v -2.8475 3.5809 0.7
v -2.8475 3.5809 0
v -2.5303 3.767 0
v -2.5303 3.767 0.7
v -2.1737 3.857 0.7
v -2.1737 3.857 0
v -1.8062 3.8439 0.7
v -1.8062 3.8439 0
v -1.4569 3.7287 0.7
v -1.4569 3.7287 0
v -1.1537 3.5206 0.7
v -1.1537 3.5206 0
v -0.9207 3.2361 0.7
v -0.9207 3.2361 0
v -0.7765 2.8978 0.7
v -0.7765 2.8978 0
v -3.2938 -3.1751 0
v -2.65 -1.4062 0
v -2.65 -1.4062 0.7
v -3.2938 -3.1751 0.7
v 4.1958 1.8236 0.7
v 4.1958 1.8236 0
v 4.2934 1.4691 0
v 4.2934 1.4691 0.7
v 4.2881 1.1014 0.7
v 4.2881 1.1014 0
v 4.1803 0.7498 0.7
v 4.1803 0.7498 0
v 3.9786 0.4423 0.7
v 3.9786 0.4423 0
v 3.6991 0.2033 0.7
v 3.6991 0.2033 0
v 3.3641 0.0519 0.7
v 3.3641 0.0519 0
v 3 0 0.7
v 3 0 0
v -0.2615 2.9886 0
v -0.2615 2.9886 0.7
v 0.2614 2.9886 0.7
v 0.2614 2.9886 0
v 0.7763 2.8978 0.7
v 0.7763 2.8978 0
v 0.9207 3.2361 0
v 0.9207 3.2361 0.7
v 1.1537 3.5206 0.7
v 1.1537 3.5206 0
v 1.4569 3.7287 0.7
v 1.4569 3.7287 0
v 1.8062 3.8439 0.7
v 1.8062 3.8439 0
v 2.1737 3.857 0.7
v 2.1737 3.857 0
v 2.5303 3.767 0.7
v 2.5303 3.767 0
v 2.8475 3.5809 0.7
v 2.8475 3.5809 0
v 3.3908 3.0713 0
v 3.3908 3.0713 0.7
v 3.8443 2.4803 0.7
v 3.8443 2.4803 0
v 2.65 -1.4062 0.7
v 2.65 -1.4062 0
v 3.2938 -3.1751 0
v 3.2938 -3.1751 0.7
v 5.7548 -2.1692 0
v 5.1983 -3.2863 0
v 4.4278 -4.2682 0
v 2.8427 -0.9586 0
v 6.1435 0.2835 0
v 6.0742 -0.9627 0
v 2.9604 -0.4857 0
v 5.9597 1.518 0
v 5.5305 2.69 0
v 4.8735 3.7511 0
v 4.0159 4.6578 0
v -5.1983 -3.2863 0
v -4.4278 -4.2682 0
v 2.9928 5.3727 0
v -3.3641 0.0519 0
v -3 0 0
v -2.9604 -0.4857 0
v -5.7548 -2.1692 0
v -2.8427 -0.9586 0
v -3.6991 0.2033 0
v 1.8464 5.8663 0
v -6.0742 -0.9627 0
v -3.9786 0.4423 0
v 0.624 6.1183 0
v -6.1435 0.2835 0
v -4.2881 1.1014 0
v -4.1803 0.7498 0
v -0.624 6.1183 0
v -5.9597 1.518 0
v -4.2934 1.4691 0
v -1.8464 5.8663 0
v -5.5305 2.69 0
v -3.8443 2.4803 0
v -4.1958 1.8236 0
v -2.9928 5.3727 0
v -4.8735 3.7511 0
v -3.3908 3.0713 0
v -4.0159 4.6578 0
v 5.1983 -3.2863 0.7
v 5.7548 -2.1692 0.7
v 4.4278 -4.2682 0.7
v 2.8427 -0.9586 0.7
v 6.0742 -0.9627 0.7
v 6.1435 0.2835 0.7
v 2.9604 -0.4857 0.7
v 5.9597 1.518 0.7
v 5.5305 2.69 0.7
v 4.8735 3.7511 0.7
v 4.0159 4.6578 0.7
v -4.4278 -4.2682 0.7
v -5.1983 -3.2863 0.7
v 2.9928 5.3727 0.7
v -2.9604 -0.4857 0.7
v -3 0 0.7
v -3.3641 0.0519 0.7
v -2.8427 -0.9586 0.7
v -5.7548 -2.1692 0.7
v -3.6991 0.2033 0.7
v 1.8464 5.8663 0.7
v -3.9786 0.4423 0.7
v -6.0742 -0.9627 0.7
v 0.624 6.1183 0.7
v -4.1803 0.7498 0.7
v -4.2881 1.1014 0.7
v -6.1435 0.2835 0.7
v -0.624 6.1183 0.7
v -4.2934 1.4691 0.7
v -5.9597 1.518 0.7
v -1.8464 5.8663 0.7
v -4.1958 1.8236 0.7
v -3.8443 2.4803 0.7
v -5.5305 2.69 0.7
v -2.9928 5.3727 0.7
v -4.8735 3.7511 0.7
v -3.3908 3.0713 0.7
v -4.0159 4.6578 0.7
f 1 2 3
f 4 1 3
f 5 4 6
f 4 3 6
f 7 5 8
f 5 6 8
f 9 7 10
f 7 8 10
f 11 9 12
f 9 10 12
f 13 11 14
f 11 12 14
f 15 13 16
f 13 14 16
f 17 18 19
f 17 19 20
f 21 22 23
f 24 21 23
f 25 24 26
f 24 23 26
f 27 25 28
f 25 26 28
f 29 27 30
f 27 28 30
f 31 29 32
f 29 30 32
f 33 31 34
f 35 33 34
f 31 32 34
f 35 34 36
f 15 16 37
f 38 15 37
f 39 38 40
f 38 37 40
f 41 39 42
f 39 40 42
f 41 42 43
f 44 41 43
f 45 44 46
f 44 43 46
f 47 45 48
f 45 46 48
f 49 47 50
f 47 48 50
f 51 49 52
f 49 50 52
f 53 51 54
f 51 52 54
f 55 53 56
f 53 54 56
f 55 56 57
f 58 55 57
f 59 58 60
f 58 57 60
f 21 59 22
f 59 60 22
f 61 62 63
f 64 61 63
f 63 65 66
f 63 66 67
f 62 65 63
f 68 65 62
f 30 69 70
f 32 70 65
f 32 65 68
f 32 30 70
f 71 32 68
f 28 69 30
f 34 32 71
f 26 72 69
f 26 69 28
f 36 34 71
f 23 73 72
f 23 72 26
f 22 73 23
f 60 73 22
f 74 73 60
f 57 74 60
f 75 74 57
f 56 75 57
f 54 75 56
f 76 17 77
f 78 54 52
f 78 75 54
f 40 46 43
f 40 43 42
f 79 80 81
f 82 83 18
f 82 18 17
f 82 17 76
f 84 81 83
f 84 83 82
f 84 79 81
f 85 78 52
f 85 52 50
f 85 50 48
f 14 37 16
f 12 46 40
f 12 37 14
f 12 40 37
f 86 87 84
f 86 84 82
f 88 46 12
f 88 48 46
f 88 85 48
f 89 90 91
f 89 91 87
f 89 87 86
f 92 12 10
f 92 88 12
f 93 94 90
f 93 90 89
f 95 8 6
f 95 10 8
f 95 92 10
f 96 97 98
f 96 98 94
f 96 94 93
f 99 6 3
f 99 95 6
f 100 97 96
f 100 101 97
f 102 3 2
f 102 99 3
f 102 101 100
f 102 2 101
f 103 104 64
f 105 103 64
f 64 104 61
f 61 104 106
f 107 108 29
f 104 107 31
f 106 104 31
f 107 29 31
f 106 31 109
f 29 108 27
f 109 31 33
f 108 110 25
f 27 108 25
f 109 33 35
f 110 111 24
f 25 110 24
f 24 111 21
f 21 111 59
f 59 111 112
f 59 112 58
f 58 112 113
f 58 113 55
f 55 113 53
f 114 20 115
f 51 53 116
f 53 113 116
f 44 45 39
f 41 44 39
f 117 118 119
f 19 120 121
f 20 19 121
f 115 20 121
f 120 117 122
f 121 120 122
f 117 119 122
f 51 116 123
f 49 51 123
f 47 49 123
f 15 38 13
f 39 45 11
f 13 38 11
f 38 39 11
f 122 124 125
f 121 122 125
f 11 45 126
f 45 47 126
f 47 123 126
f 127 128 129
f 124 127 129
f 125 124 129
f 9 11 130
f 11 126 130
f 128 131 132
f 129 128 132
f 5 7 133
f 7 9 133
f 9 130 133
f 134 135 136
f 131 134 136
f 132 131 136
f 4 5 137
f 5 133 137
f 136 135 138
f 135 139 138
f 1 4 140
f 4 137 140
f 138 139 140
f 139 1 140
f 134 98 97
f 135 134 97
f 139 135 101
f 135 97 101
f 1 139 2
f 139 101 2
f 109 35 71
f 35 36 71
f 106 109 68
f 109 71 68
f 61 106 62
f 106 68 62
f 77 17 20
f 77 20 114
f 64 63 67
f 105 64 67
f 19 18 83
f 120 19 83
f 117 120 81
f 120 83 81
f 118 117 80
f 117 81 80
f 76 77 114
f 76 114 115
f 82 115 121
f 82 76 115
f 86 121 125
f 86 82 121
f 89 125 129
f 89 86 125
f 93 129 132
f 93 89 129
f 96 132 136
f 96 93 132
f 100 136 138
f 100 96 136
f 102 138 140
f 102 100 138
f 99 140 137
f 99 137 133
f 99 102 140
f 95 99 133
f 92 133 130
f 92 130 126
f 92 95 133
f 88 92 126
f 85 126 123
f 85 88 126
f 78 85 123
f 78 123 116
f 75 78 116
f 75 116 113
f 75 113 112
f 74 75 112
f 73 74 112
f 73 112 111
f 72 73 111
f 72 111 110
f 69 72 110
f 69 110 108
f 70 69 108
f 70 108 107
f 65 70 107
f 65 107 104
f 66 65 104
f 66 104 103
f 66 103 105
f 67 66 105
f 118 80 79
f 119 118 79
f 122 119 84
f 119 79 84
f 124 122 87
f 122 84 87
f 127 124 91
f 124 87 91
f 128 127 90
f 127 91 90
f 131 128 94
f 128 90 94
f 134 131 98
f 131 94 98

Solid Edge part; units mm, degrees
sketch "Sketch1" plane through (0, 0, 0) normal (0, 0, 1) x (1, 0, 0)
  arc A0 (-4.1958, 1.8236) -> (-3, 0) centre (-3, 1.3039) ccw
  arc A1 (-2.65, -1.4062) -> (-3, 0) centre (0, 0) cw
  line L0 (-2.65, -1.4062) -> (-3.2938, -3.1751)
  line L1 (-3.2938, -3.1751) -> (-4.4278, -4.2682)
  arc A2 (-4.4278, -4.2682) -> (4.4278, -4.2682) centre (0, 0) cw
  line L2 (3.2938, -3.1751) -> (4.4278, -4.2682)
  line L3 (2.65, -1.4062) -> (3.2938, -3.1751)
  arc A3 (3, 0) -> (2.65, -1.4062) centre (0, 0) cw
  arc A4 (4.1958, 1.8236) -> (3, 0) centre (3, 1.3039) cw
  arc A5 (2.8475, 3.5809) -> (4.1958, 1.8236) centre (0, 0) cw
  arc A6 (2.8475, 3.5809) -> (0.7765, 2.8978) centre (2.0359, 2.5603) ccw
  arc A7 (-0.7765, 2.8978) -> (0.7765, 2.8978) centre (0, 0) cw
  arc A8 (-2.8475, 3.5809) -> (-0.7765, 2.8978) centre (-2.0359, 2.5603) cw
  arc A9 (-4.1958, 1.8236) -> (-2.8475, 3.5809) centre (0, 0) cw
  dimension "D1" = 6.15
  dimension "D2" = 3
  dimension "D3" = 4.575
  dimension "D4" = 2.65
extrude "Protrusion1" add sketch "Sketch1" along normal blind 0.7
properties material "Acier"
